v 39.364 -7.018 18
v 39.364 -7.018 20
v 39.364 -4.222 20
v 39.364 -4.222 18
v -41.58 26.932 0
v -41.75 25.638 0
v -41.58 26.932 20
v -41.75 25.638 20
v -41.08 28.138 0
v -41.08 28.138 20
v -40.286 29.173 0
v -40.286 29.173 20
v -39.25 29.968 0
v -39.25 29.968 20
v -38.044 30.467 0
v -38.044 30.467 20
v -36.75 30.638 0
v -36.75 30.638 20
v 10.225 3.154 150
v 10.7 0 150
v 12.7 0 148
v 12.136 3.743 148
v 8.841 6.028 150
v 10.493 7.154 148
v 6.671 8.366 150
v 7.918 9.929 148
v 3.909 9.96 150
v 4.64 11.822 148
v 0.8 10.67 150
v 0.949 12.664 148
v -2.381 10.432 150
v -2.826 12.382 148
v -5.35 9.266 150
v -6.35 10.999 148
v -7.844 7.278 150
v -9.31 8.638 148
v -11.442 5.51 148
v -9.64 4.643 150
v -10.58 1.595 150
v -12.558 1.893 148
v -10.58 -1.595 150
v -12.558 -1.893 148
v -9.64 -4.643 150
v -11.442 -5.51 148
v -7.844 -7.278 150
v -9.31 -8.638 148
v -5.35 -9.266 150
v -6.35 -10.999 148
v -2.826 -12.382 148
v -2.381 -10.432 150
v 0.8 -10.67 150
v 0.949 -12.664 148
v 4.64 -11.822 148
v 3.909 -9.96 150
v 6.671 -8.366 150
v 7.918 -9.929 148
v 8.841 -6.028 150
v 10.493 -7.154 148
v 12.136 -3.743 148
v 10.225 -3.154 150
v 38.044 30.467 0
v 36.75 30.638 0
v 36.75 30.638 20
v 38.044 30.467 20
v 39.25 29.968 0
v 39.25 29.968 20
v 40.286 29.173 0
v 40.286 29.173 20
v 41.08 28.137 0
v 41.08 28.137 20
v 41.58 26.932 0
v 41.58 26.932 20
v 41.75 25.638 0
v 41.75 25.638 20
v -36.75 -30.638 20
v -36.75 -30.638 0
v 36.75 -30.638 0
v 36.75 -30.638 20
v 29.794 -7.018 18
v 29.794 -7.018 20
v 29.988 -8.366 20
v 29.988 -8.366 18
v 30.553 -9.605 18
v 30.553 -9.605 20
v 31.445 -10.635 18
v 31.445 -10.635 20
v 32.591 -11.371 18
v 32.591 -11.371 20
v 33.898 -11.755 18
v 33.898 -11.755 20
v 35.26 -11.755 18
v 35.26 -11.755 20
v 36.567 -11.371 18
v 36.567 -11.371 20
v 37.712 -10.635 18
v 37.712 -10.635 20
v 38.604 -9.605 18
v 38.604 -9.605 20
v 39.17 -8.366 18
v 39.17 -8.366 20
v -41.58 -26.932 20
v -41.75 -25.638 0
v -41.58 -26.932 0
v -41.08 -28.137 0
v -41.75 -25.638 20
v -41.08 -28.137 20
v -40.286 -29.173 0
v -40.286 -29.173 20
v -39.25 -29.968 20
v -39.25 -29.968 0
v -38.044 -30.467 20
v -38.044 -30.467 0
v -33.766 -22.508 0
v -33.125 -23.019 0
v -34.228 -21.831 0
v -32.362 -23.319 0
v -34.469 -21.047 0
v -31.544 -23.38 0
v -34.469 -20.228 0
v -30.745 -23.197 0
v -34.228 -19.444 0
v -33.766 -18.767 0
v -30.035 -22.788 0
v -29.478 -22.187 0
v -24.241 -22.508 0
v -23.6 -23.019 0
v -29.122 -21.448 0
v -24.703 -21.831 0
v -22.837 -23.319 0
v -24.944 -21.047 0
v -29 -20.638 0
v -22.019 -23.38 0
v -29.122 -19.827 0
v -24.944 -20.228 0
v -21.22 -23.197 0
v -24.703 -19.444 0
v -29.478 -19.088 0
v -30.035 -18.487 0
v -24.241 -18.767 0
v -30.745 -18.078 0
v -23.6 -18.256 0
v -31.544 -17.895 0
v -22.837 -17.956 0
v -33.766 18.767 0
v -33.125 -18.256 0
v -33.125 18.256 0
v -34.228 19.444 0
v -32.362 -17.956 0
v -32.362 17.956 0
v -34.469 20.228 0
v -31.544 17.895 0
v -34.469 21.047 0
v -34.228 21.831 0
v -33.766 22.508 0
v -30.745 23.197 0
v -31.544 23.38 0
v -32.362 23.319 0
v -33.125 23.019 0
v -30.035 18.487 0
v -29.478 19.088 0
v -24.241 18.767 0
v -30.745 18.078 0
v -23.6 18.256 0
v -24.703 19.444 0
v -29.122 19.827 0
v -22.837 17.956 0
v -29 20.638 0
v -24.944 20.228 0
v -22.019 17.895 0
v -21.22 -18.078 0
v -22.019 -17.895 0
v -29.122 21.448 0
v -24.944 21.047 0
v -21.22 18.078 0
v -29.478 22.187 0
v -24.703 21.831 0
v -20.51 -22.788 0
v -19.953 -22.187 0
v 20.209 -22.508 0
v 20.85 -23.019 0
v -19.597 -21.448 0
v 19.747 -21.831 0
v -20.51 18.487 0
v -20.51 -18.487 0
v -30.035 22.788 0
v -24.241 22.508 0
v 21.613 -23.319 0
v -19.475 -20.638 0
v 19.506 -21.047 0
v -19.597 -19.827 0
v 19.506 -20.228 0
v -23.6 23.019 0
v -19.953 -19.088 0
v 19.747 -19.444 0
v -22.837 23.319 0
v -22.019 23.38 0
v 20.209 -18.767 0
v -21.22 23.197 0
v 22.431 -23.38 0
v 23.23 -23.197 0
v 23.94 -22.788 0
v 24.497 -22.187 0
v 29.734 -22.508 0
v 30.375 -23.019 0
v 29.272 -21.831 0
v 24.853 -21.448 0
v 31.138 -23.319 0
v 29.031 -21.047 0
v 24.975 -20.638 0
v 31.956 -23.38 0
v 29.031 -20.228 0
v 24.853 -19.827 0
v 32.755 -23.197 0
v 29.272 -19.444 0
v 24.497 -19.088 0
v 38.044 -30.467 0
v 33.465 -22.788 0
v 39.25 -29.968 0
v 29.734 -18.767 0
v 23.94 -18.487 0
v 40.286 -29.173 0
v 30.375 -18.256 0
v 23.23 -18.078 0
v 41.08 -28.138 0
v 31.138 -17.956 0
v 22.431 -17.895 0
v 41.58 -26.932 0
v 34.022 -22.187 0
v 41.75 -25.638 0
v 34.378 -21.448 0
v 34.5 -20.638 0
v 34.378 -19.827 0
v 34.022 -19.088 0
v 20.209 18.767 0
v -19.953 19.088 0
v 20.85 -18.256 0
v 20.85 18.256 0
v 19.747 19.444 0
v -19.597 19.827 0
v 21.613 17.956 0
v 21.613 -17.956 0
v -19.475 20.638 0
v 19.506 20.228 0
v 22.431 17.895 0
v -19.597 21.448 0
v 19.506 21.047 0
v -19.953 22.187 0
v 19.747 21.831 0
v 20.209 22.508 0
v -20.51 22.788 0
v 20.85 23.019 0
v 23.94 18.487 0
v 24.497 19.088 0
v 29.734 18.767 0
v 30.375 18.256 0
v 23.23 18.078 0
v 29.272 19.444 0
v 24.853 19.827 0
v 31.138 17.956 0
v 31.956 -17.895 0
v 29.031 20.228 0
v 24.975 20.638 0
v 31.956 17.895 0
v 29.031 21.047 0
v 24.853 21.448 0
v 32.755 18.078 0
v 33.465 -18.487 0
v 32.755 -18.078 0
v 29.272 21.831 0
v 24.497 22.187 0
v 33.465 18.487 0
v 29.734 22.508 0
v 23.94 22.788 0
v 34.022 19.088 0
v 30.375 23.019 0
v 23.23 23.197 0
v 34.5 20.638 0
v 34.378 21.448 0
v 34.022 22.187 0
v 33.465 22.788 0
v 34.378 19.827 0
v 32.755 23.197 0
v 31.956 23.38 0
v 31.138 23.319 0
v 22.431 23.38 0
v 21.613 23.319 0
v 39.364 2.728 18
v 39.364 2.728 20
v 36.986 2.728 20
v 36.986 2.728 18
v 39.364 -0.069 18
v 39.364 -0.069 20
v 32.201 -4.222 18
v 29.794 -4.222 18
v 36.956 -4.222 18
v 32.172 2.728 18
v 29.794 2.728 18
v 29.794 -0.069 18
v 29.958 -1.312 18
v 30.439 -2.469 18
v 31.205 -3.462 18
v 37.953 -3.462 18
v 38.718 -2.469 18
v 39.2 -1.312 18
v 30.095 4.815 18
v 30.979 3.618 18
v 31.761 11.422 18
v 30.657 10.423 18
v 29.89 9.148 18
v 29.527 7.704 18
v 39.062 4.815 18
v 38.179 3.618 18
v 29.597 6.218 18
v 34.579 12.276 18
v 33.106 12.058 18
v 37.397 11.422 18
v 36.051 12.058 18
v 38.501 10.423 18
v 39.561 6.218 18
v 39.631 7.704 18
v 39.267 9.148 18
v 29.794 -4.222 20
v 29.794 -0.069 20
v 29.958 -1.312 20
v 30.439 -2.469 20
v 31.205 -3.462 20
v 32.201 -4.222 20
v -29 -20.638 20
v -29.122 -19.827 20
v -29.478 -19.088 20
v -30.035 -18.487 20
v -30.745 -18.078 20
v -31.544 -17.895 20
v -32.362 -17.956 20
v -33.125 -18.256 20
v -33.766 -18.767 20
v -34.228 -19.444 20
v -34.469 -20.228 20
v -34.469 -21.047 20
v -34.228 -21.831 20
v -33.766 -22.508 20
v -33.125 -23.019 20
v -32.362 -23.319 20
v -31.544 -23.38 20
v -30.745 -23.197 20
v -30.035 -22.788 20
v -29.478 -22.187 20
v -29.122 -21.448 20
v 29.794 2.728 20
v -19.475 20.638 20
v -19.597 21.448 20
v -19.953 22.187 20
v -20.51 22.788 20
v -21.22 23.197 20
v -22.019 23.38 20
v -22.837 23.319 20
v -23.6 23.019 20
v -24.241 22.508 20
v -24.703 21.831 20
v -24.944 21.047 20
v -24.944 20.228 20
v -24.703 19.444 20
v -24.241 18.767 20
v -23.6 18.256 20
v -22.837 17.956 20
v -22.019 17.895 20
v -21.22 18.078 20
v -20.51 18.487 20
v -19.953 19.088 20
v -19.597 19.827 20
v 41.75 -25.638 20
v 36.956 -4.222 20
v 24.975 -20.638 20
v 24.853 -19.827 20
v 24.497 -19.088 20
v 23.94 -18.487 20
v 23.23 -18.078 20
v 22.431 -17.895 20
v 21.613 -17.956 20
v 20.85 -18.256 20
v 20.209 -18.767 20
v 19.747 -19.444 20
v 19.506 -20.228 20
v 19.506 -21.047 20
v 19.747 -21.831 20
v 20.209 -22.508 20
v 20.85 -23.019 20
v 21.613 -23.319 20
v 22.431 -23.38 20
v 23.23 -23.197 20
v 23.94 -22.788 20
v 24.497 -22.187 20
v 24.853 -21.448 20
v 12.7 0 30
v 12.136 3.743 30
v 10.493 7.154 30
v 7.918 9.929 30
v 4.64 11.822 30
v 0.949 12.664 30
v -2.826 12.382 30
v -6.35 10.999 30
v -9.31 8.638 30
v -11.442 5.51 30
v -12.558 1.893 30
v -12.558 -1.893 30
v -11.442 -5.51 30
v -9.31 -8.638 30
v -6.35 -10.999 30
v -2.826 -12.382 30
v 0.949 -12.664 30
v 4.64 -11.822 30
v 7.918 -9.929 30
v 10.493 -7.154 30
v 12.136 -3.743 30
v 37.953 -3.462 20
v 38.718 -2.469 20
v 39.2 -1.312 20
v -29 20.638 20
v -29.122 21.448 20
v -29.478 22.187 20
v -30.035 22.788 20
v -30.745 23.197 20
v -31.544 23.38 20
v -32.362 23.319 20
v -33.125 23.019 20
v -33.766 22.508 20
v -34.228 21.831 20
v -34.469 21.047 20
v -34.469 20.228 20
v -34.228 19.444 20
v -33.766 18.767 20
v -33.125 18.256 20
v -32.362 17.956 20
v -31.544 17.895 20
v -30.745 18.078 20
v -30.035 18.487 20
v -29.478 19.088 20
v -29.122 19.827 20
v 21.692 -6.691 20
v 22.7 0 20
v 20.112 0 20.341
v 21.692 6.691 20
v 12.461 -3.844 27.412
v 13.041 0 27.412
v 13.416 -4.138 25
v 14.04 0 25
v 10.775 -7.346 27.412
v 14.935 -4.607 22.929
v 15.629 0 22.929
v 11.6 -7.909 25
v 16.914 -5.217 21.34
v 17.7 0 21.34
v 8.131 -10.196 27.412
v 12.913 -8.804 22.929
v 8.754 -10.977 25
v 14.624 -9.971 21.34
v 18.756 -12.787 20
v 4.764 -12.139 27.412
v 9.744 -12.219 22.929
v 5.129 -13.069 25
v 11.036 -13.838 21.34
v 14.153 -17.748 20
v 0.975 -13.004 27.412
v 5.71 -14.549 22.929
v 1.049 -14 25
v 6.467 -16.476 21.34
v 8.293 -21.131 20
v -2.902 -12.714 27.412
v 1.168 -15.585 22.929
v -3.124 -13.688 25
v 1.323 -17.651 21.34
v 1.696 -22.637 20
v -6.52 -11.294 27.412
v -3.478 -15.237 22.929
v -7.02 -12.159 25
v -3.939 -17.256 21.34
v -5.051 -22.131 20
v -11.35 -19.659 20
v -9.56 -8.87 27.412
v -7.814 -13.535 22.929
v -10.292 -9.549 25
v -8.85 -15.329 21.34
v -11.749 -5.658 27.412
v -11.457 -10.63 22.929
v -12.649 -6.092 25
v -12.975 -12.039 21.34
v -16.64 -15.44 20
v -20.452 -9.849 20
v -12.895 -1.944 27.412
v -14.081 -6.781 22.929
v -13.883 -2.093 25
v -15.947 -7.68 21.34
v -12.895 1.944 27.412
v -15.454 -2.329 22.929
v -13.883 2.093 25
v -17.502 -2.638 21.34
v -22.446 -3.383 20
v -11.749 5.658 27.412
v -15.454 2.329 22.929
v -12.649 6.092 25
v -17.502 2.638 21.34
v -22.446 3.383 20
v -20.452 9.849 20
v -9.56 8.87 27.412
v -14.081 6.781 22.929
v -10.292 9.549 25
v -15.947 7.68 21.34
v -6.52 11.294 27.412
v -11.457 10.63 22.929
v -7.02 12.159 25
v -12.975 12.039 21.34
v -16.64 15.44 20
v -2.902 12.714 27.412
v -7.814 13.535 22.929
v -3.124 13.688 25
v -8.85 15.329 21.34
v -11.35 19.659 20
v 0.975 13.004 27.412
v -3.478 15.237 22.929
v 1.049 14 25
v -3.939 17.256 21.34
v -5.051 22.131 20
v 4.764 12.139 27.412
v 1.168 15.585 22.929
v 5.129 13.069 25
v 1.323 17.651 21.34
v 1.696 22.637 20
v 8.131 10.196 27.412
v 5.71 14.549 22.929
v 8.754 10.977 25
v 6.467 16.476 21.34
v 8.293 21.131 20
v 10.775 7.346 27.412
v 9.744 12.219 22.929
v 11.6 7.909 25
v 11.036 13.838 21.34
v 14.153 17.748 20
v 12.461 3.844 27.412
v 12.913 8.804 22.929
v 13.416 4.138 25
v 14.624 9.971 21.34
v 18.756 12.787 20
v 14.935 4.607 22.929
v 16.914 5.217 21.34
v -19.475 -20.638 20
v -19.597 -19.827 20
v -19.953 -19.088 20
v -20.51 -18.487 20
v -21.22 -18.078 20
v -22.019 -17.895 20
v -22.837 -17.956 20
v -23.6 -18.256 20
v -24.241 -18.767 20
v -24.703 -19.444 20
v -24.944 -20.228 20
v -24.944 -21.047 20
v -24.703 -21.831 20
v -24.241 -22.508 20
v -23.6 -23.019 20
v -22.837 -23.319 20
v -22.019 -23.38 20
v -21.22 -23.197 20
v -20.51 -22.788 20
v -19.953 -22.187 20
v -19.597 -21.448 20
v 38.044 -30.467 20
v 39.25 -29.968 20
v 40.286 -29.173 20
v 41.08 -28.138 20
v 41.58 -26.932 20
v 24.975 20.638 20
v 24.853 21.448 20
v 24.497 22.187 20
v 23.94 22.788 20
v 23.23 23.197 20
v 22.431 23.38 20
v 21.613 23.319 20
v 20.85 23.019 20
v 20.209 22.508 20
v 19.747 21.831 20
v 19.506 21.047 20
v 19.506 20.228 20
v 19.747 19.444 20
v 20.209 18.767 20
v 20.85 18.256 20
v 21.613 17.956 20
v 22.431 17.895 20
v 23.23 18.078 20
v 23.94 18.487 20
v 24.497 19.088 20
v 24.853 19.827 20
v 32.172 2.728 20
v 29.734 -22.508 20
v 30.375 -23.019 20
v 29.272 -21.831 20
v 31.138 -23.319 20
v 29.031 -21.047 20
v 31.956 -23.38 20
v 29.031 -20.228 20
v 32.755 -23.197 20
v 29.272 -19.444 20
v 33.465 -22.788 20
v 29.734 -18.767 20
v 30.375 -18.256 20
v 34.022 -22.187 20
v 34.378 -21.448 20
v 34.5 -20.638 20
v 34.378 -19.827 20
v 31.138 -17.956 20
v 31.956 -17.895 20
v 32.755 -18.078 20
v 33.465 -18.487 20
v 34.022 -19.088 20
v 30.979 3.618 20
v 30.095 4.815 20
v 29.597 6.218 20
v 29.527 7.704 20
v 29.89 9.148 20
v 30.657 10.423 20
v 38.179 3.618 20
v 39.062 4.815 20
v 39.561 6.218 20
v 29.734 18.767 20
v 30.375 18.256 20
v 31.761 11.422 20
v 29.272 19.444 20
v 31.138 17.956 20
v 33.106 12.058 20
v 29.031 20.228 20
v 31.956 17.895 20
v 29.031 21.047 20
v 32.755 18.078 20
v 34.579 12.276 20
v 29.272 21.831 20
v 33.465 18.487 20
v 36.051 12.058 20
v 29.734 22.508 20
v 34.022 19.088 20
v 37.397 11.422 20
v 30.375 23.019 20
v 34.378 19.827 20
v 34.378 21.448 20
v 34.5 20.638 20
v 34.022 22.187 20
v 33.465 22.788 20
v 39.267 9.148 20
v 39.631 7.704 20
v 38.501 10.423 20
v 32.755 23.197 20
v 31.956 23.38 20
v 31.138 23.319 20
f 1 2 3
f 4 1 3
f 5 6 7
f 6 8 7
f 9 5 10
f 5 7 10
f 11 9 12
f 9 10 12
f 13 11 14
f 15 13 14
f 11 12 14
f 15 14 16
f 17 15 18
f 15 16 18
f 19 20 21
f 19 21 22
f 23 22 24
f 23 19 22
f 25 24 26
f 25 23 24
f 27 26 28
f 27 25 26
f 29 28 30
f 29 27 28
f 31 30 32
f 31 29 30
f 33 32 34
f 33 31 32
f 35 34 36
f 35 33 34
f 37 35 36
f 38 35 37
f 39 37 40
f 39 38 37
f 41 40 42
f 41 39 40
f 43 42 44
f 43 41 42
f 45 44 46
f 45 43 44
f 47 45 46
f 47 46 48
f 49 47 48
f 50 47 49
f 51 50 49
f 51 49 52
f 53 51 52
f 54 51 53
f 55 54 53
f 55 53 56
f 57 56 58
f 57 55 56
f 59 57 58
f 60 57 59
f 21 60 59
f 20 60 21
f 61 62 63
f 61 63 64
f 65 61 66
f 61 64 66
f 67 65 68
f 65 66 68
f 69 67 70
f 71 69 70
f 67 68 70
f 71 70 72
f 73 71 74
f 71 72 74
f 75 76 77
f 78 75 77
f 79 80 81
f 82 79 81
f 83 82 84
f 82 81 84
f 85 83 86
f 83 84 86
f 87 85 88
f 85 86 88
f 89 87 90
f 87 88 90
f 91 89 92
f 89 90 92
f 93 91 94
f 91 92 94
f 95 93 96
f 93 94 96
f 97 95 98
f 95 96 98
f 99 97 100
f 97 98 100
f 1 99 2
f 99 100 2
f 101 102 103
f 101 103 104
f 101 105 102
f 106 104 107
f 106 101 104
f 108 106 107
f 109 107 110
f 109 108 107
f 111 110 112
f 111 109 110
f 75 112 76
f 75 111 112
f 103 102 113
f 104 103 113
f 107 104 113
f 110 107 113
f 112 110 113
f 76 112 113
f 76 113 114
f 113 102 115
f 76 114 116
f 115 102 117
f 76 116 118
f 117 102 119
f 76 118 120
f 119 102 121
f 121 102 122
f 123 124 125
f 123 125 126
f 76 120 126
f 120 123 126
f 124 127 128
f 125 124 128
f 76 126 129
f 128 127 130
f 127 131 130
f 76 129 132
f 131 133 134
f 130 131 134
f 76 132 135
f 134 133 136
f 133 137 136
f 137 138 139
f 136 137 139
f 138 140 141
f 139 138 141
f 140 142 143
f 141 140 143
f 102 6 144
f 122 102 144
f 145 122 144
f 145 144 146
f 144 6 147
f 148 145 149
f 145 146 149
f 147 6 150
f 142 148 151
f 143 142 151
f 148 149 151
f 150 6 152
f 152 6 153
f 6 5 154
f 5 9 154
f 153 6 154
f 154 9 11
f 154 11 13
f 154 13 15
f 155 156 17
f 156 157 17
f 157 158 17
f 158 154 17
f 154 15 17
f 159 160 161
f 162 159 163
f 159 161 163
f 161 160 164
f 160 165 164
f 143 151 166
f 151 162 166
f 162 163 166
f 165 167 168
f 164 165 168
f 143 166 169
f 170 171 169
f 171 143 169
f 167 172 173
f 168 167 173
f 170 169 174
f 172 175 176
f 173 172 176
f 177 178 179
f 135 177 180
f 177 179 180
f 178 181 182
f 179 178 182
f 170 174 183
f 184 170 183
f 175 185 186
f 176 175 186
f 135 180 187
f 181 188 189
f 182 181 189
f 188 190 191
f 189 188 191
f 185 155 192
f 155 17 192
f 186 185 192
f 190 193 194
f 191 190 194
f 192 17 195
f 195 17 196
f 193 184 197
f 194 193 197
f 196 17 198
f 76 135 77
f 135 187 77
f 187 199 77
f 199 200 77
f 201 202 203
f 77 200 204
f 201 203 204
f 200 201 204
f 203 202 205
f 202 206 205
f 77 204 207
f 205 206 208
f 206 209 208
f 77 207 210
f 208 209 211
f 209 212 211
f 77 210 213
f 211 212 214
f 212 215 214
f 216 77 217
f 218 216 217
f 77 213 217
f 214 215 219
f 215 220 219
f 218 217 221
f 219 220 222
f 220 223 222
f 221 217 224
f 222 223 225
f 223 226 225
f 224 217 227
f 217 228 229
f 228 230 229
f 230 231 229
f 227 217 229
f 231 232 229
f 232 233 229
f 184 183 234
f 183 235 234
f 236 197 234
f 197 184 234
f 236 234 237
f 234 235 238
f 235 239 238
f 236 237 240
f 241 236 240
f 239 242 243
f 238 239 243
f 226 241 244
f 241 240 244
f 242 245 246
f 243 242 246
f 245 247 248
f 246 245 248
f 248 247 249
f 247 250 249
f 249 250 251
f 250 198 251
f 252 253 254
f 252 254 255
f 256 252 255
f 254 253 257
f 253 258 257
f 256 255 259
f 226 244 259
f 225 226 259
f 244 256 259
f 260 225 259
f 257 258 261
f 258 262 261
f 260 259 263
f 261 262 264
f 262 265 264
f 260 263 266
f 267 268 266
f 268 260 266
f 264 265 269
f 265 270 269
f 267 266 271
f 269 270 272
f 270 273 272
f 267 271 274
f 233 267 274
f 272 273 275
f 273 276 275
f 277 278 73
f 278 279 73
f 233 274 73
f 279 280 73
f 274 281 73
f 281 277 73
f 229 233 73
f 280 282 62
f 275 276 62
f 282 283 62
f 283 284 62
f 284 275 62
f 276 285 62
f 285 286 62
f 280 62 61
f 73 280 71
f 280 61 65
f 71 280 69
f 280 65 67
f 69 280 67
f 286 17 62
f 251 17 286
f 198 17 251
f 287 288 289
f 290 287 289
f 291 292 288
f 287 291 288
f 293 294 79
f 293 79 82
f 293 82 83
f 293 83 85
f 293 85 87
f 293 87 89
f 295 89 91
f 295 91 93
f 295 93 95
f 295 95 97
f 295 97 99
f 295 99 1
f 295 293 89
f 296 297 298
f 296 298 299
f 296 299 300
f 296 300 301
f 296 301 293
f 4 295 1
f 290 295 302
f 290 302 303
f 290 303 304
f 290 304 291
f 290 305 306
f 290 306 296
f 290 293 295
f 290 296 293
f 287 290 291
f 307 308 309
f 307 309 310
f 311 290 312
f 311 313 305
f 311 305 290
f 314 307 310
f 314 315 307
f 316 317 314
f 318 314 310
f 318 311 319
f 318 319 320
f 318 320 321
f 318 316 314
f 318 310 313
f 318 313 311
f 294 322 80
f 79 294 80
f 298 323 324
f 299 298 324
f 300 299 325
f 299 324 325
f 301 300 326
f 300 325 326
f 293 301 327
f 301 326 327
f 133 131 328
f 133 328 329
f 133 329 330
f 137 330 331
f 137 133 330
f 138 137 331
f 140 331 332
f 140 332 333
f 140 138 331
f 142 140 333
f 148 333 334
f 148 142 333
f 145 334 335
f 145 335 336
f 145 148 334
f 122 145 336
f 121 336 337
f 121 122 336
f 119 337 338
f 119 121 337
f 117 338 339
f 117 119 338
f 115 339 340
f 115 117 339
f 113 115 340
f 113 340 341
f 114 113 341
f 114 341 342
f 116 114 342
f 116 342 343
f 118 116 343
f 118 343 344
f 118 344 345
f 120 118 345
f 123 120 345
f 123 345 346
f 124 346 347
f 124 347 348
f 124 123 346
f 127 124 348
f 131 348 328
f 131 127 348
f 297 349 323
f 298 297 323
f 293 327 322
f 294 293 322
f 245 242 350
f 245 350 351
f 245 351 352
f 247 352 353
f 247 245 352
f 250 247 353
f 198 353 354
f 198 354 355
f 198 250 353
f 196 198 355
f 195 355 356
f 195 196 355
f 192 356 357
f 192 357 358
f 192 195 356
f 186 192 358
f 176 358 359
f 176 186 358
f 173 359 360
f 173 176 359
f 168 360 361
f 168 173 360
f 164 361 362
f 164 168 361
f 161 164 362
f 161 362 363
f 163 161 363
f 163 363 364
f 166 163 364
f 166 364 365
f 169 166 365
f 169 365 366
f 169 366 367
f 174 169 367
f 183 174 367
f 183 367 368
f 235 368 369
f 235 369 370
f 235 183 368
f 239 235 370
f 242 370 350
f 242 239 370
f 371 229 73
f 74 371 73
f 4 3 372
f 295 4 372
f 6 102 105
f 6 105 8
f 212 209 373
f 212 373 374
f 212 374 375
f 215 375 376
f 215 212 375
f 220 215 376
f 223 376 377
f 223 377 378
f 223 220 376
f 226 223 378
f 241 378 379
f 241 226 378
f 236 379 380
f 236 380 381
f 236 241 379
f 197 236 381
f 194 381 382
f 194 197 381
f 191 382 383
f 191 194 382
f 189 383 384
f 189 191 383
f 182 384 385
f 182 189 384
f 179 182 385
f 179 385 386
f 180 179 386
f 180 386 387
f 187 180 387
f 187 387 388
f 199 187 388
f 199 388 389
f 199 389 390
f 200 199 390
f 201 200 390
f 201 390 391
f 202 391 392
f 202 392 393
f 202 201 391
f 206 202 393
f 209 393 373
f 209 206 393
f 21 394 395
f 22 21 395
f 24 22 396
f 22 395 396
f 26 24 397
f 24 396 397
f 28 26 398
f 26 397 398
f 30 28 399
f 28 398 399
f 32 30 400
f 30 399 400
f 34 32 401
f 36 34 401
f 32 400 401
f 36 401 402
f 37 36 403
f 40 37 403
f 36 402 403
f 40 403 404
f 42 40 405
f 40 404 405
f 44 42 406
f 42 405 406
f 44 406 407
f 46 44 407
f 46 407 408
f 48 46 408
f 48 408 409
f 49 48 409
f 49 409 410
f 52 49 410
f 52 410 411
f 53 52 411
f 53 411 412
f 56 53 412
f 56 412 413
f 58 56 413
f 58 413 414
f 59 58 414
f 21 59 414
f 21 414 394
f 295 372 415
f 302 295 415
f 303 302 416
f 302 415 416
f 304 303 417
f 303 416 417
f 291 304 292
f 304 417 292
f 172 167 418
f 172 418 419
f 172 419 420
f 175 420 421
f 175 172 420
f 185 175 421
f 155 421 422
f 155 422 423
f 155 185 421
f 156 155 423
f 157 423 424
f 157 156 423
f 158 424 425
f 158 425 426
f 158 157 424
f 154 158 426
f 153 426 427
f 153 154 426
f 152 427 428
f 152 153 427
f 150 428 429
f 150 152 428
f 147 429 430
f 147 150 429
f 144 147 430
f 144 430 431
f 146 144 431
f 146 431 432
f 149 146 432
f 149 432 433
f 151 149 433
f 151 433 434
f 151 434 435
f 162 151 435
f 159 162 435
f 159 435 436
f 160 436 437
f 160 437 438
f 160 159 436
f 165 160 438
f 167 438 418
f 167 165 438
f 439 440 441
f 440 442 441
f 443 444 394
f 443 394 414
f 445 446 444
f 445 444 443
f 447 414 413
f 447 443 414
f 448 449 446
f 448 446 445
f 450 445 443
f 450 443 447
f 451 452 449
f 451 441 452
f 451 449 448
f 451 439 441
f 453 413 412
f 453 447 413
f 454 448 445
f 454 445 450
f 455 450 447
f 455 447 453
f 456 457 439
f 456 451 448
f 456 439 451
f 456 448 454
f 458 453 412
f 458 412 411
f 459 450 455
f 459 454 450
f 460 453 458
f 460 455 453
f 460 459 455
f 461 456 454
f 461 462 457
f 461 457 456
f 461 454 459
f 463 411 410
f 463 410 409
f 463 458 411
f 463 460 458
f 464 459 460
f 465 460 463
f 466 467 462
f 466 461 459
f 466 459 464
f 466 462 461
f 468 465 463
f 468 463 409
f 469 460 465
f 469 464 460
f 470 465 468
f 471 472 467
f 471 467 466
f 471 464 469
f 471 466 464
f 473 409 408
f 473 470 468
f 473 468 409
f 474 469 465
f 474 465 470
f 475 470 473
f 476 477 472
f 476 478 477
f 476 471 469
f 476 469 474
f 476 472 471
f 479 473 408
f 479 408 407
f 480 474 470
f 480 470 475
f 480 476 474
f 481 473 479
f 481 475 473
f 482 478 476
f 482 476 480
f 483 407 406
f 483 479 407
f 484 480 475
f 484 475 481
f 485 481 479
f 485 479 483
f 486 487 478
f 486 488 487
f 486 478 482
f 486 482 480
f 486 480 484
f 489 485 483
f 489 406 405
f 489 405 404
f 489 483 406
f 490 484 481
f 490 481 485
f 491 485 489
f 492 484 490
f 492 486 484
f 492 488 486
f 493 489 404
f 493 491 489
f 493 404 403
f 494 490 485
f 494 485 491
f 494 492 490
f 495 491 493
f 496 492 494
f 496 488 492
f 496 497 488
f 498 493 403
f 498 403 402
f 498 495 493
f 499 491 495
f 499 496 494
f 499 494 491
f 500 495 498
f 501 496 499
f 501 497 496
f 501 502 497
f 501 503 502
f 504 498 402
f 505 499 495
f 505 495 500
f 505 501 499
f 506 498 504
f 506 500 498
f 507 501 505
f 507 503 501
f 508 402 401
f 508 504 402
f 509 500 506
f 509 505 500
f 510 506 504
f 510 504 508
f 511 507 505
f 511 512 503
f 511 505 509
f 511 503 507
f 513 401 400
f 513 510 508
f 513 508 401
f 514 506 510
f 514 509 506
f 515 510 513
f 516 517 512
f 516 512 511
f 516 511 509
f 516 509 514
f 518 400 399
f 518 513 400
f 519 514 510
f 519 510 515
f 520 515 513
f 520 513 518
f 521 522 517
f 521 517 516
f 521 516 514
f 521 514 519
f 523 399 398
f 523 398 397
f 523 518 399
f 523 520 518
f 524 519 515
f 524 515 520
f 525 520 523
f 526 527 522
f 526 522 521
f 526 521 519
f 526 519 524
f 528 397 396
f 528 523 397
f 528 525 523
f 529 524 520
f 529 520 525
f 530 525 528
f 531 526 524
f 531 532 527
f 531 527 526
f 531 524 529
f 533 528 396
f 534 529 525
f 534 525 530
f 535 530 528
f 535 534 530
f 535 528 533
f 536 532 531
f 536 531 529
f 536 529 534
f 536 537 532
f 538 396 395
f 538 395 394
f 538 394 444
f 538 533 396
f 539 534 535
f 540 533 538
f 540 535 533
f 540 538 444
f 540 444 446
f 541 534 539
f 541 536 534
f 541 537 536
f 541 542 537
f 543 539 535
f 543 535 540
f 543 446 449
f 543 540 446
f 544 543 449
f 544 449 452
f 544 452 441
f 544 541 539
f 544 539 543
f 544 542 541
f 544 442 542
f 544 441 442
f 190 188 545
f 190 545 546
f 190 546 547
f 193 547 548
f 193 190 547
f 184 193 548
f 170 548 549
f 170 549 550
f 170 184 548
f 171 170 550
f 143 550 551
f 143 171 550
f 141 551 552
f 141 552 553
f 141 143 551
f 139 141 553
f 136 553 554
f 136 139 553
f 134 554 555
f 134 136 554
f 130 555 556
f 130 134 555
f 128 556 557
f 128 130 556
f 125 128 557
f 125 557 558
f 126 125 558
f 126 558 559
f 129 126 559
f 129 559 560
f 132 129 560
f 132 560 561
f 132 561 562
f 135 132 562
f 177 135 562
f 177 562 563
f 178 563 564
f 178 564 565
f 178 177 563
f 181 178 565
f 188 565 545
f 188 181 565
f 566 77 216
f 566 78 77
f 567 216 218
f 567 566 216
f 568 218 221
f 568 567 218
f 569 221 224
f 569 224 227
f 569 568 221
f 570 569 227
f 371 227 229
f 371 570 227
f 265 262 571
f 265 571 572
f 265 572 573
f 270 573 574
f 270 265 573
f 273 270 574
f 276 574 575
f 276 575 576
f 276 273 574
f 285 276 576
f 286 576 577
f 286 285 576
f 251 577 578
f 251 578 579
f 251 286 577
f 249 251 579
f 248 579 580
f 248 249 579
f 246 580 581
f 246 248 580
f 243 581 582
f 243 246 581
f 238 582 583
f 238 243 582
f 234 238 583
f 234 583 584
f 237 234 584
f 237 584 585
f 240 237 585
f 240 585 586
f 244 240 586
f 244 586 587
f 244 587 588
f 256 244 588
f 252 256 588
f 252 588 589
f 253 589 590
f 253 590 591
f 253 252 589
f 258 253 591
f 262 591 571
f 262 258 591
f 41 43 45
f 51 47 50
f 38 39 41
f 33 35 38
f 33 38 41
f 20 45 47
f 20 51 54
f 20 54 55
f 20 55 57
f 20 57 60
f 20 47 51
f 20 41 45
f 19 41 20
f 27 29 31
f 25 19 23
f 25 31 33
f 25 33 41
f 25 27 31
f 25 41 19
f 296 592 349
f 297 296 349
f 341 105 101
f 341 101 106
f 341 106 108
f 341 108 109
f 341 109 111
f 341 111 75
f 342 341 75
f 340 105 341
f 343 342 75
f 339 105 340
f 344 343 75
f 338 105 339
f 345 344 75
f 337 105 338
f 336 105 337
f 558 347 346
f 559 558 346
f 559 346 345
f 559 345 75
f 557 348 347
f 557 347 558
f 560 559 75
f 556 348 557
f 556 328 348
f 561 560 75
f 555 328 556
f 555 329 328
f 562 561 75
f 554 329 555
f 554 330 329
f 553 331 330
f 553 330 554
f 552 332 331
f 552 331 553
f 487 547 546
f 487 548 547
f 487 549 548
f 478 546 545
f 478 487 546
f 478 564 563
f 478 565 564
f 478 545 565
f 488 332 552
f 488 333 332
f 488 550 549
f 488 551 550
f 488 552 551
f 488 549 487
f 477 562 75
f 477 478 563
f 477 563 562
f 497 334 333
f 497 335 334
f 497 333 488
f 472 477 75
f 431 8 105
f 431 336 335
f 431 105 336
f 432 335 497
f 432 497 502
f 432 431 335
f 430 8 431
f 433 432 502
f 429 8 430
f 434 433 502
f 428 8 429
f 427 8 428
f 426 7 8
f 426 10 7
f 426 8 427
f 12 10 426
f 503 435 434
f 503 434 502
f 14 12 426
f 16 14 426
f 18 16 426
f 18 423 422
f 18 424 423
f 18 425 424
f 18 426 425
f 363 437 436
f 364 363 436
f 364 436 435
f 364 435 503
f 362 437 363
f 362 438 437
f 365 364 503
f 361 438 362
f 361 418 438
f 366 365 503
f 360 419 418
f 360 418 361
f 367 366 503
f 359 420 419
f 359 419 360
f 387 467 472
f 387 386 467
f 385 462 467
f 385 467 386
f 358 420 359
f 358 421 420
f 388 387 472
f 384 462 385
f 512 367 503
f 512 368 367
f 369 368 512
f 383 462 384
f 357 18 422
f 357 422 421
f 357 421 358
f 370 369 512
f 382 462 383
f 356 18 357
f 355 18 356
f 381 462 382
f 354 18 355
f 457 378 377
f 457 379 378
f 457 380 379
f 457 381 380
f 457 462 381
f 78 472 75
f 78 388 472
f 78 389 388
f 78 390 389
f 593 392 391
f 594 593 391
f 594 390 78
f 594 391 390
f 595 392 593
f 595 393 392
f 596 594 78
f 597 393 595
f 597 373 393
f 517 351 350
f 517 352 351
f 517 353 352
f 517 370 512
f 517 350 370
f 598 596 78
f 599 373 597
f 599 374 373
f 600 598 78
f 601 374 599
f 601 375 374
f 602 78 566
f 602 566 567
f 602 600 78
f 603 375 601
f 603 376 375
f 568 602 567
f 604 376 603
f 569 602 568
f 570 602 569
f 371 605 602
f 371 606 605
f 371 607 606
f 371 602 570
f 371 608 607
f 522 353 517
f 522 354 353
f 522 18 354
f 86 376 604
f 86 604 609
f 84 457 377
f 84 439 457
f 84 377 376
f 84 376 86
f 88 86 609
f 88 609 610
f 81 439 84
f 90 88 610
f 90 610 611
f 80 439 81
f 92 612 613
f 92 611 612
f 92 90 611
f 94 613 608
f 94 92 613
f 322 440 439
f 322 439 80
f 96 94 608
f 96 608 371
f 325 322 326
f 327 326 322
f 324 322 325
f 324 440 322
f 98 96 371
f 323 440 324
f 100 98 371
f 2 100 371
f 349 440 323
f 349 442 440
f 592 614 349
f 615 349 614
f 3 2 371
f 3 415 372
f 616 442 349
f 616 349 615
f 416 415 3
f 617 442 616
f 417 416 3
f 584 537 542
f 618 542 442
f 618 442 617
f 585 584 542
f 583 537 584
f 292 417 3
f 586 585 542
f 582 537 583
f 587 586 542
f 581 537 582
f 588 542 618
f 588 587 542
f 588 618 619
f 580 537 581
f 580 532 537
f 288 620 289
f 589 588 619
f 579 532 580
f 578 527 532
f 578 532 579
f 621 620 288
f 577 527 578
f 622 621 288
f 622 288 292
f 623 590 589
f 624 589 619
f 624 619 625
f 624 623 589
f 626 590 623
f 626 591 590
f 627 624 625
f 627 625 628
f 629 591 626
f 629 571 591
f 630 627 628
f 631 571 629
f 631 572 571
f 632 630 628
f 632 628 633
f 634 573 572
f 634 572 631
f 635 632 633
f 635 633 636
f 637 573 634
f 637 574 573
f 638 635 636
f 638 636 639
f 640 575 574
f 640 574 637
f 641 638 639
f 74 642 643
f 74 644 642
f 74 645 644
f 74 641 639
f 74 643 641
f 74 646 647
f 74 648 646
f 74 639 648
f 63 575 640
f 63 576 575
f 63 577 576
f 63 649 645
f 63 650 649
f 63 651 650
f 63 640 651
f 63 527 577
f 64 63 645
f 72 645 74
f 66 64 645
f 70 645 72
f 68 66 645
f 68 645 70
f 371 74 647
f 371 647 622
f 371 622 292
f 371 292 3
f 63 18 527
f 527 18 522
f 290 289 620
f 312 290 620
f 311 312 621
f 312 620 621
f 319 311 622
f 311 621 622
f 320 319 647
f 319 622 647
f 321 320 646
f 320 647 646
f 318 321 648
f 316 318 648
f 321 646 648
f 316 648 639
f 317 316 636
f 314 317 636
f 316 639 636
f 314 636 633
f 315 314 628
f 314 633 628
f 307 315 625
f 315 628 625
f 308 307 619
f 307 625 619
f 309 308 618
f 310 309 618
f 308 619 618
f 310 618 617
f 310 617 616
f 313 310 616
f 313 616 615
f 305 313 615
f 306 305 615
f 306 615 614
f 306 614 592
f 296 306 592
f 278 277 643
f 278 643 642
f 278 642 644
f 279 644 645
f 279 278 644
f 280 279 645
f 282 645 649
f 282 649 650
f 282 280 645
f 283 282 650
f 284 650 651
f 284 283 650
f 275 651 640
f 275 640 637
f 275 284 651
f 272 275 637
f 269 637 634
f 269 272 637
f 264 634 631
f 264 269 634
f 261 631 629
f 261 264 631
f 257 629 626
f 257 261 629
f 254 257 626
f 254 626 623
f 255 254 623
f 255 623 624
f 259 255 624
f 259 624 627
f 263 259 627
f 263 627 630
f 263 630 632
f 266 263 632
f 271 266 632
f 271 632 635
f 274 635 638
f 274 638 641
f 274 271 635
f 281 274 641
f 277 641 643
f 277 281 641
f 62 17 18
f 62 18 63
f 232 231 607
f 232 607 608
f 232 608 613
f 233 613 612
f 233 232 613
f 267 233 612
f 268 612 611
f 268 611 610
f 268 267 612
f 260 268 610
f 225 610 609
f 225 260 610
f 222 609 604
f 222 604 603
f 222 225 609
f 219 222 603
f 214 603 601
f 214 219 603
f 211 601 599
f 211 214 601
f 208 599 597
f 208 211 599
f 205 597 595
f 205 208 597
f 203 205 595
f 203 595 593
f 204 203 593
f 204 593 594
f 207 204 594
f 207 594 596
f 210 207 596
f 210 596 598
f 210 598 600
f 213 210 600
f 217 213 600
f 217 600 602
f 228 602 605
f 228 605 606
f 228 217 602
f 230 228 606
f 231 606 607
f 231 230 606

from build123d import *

# Parameters (mm, degrees)
F0_W     = 83.5
F0_H     = 61.275
F0_R     = 2.75
F1_DEPTH = 20
F2_R     = 5
F3_R     = 12.7
F4_DEPTH = 150
F5_SIZE  = 2
F6_R     = 10
F8_DEPTH = 2


with BuildPart() as f1:
    # F0 (on Top) → F1 (new body)
    with BuildSketch(Plane.XY):
        Rectangle(F0_W, F0_H)
        with Locations((-31.75, -20.6375)):
            Circle(F0_R, mode=Mode.SUBTRACT)
        with Locations((-22.225, -20.6375)):
            Circle(F0_R, mode=Mode.SUBTRACT)
        with Locations((22.225, -20.6375)):
            Circle(F0_R, mode=Mode.SUBTRACT)
        with Locations((31.75, -20.6375)):
            Circle(F0_R, mode=Mode.SUBTRACT)
        with Locations((-31.75, 20.6375)):
            Circle(F0_R, mode=Mode.SUBTRACT)
        with Locations((-22.225, 20.6375)):
            Circle(F0_R, mode=Mode.SUBTRACT)
        with Locations((22.225, 20.6375)):
            Circle(F0_R, mode=Mode.SUBTRACT)
        with Locations((31.75, 20.6375)):
            Circle(F0_R, mode=Mode.SUBTRACT)
    extrude(amount=F1_DEPTH)

    # F2
    f2_edges = [f1.edges().sort_by_distance(p)[0] for p in [
        (-41.75, -30.6375, 10),
        (41.75, -30.6375, 10),
        (-41.75, 30.6375, 10),
        (41.75, 30.6375, 10),
    ]]
    fillet(f2_edges, radius=F2_R)

    # F3 (on Top) → F4 (join)
    with BuildSketch(Plane.XY):
        Circle(F3_R)
    extrude(amount=F4_DEPTH)

    # F5
    f5_edges = [f1.edges().sort_by_distance(p)[0] for p in [
        (-12.7, 0, 150),
    ]]
    chamfer(f5_edges, length=F5_SIZE)

    # F6
    f6_edges = [f1.edges().sort_by_distance(p)[0] for p in [
        (-12.7, 0, 20),
    ]]
    fillet(f6_edges, radius=F6_R)

    # F7 (on face) → F8 (cut)
    with BuildSketch(Plane.XY.offset(20)):
        with BuildLine():
            Line((29.793699, 2.727646), (29.793699, -0.068939))
            ThreePointArc((29.793699, -0.068939), (30.439165, -2.469058), (32.201427, -4.221665))
            Line((32.201427, -4.221665), (29.7937, -4.221665))
            Line((29.7937, -4.221665), (29.7937, -7.018251))
            ThreePointArc((29.7937, -7.018251), (34.578768, -11.803318), (39.363836, -7.018251))
            Line((39.363836, -7.018251), (39.363836, -4.221665))
            Line((39.363836, -4.221665), (36.956107, -4.221665))
            ThreePointArc((36.956107, -4.221665), (38.718369, -2.469058), (39.363835, -0.068939))
            Line((39.363835, -0.068939), (39.363835, 2.727646))
            Line((39.363835, 2.727646), (36.985549, 2.727646))
            ThreePointArc((36.985549, 2.727646), (34.578767, 12.275941), (32.171985, 2.727646))
            Line((32.171985, 2.727646), (29.793699, 2.727646))
        make_face()
    extrude(amount=-F8_DEPTH, mode=Mode.SUBTRACT)


solid = f1.part
